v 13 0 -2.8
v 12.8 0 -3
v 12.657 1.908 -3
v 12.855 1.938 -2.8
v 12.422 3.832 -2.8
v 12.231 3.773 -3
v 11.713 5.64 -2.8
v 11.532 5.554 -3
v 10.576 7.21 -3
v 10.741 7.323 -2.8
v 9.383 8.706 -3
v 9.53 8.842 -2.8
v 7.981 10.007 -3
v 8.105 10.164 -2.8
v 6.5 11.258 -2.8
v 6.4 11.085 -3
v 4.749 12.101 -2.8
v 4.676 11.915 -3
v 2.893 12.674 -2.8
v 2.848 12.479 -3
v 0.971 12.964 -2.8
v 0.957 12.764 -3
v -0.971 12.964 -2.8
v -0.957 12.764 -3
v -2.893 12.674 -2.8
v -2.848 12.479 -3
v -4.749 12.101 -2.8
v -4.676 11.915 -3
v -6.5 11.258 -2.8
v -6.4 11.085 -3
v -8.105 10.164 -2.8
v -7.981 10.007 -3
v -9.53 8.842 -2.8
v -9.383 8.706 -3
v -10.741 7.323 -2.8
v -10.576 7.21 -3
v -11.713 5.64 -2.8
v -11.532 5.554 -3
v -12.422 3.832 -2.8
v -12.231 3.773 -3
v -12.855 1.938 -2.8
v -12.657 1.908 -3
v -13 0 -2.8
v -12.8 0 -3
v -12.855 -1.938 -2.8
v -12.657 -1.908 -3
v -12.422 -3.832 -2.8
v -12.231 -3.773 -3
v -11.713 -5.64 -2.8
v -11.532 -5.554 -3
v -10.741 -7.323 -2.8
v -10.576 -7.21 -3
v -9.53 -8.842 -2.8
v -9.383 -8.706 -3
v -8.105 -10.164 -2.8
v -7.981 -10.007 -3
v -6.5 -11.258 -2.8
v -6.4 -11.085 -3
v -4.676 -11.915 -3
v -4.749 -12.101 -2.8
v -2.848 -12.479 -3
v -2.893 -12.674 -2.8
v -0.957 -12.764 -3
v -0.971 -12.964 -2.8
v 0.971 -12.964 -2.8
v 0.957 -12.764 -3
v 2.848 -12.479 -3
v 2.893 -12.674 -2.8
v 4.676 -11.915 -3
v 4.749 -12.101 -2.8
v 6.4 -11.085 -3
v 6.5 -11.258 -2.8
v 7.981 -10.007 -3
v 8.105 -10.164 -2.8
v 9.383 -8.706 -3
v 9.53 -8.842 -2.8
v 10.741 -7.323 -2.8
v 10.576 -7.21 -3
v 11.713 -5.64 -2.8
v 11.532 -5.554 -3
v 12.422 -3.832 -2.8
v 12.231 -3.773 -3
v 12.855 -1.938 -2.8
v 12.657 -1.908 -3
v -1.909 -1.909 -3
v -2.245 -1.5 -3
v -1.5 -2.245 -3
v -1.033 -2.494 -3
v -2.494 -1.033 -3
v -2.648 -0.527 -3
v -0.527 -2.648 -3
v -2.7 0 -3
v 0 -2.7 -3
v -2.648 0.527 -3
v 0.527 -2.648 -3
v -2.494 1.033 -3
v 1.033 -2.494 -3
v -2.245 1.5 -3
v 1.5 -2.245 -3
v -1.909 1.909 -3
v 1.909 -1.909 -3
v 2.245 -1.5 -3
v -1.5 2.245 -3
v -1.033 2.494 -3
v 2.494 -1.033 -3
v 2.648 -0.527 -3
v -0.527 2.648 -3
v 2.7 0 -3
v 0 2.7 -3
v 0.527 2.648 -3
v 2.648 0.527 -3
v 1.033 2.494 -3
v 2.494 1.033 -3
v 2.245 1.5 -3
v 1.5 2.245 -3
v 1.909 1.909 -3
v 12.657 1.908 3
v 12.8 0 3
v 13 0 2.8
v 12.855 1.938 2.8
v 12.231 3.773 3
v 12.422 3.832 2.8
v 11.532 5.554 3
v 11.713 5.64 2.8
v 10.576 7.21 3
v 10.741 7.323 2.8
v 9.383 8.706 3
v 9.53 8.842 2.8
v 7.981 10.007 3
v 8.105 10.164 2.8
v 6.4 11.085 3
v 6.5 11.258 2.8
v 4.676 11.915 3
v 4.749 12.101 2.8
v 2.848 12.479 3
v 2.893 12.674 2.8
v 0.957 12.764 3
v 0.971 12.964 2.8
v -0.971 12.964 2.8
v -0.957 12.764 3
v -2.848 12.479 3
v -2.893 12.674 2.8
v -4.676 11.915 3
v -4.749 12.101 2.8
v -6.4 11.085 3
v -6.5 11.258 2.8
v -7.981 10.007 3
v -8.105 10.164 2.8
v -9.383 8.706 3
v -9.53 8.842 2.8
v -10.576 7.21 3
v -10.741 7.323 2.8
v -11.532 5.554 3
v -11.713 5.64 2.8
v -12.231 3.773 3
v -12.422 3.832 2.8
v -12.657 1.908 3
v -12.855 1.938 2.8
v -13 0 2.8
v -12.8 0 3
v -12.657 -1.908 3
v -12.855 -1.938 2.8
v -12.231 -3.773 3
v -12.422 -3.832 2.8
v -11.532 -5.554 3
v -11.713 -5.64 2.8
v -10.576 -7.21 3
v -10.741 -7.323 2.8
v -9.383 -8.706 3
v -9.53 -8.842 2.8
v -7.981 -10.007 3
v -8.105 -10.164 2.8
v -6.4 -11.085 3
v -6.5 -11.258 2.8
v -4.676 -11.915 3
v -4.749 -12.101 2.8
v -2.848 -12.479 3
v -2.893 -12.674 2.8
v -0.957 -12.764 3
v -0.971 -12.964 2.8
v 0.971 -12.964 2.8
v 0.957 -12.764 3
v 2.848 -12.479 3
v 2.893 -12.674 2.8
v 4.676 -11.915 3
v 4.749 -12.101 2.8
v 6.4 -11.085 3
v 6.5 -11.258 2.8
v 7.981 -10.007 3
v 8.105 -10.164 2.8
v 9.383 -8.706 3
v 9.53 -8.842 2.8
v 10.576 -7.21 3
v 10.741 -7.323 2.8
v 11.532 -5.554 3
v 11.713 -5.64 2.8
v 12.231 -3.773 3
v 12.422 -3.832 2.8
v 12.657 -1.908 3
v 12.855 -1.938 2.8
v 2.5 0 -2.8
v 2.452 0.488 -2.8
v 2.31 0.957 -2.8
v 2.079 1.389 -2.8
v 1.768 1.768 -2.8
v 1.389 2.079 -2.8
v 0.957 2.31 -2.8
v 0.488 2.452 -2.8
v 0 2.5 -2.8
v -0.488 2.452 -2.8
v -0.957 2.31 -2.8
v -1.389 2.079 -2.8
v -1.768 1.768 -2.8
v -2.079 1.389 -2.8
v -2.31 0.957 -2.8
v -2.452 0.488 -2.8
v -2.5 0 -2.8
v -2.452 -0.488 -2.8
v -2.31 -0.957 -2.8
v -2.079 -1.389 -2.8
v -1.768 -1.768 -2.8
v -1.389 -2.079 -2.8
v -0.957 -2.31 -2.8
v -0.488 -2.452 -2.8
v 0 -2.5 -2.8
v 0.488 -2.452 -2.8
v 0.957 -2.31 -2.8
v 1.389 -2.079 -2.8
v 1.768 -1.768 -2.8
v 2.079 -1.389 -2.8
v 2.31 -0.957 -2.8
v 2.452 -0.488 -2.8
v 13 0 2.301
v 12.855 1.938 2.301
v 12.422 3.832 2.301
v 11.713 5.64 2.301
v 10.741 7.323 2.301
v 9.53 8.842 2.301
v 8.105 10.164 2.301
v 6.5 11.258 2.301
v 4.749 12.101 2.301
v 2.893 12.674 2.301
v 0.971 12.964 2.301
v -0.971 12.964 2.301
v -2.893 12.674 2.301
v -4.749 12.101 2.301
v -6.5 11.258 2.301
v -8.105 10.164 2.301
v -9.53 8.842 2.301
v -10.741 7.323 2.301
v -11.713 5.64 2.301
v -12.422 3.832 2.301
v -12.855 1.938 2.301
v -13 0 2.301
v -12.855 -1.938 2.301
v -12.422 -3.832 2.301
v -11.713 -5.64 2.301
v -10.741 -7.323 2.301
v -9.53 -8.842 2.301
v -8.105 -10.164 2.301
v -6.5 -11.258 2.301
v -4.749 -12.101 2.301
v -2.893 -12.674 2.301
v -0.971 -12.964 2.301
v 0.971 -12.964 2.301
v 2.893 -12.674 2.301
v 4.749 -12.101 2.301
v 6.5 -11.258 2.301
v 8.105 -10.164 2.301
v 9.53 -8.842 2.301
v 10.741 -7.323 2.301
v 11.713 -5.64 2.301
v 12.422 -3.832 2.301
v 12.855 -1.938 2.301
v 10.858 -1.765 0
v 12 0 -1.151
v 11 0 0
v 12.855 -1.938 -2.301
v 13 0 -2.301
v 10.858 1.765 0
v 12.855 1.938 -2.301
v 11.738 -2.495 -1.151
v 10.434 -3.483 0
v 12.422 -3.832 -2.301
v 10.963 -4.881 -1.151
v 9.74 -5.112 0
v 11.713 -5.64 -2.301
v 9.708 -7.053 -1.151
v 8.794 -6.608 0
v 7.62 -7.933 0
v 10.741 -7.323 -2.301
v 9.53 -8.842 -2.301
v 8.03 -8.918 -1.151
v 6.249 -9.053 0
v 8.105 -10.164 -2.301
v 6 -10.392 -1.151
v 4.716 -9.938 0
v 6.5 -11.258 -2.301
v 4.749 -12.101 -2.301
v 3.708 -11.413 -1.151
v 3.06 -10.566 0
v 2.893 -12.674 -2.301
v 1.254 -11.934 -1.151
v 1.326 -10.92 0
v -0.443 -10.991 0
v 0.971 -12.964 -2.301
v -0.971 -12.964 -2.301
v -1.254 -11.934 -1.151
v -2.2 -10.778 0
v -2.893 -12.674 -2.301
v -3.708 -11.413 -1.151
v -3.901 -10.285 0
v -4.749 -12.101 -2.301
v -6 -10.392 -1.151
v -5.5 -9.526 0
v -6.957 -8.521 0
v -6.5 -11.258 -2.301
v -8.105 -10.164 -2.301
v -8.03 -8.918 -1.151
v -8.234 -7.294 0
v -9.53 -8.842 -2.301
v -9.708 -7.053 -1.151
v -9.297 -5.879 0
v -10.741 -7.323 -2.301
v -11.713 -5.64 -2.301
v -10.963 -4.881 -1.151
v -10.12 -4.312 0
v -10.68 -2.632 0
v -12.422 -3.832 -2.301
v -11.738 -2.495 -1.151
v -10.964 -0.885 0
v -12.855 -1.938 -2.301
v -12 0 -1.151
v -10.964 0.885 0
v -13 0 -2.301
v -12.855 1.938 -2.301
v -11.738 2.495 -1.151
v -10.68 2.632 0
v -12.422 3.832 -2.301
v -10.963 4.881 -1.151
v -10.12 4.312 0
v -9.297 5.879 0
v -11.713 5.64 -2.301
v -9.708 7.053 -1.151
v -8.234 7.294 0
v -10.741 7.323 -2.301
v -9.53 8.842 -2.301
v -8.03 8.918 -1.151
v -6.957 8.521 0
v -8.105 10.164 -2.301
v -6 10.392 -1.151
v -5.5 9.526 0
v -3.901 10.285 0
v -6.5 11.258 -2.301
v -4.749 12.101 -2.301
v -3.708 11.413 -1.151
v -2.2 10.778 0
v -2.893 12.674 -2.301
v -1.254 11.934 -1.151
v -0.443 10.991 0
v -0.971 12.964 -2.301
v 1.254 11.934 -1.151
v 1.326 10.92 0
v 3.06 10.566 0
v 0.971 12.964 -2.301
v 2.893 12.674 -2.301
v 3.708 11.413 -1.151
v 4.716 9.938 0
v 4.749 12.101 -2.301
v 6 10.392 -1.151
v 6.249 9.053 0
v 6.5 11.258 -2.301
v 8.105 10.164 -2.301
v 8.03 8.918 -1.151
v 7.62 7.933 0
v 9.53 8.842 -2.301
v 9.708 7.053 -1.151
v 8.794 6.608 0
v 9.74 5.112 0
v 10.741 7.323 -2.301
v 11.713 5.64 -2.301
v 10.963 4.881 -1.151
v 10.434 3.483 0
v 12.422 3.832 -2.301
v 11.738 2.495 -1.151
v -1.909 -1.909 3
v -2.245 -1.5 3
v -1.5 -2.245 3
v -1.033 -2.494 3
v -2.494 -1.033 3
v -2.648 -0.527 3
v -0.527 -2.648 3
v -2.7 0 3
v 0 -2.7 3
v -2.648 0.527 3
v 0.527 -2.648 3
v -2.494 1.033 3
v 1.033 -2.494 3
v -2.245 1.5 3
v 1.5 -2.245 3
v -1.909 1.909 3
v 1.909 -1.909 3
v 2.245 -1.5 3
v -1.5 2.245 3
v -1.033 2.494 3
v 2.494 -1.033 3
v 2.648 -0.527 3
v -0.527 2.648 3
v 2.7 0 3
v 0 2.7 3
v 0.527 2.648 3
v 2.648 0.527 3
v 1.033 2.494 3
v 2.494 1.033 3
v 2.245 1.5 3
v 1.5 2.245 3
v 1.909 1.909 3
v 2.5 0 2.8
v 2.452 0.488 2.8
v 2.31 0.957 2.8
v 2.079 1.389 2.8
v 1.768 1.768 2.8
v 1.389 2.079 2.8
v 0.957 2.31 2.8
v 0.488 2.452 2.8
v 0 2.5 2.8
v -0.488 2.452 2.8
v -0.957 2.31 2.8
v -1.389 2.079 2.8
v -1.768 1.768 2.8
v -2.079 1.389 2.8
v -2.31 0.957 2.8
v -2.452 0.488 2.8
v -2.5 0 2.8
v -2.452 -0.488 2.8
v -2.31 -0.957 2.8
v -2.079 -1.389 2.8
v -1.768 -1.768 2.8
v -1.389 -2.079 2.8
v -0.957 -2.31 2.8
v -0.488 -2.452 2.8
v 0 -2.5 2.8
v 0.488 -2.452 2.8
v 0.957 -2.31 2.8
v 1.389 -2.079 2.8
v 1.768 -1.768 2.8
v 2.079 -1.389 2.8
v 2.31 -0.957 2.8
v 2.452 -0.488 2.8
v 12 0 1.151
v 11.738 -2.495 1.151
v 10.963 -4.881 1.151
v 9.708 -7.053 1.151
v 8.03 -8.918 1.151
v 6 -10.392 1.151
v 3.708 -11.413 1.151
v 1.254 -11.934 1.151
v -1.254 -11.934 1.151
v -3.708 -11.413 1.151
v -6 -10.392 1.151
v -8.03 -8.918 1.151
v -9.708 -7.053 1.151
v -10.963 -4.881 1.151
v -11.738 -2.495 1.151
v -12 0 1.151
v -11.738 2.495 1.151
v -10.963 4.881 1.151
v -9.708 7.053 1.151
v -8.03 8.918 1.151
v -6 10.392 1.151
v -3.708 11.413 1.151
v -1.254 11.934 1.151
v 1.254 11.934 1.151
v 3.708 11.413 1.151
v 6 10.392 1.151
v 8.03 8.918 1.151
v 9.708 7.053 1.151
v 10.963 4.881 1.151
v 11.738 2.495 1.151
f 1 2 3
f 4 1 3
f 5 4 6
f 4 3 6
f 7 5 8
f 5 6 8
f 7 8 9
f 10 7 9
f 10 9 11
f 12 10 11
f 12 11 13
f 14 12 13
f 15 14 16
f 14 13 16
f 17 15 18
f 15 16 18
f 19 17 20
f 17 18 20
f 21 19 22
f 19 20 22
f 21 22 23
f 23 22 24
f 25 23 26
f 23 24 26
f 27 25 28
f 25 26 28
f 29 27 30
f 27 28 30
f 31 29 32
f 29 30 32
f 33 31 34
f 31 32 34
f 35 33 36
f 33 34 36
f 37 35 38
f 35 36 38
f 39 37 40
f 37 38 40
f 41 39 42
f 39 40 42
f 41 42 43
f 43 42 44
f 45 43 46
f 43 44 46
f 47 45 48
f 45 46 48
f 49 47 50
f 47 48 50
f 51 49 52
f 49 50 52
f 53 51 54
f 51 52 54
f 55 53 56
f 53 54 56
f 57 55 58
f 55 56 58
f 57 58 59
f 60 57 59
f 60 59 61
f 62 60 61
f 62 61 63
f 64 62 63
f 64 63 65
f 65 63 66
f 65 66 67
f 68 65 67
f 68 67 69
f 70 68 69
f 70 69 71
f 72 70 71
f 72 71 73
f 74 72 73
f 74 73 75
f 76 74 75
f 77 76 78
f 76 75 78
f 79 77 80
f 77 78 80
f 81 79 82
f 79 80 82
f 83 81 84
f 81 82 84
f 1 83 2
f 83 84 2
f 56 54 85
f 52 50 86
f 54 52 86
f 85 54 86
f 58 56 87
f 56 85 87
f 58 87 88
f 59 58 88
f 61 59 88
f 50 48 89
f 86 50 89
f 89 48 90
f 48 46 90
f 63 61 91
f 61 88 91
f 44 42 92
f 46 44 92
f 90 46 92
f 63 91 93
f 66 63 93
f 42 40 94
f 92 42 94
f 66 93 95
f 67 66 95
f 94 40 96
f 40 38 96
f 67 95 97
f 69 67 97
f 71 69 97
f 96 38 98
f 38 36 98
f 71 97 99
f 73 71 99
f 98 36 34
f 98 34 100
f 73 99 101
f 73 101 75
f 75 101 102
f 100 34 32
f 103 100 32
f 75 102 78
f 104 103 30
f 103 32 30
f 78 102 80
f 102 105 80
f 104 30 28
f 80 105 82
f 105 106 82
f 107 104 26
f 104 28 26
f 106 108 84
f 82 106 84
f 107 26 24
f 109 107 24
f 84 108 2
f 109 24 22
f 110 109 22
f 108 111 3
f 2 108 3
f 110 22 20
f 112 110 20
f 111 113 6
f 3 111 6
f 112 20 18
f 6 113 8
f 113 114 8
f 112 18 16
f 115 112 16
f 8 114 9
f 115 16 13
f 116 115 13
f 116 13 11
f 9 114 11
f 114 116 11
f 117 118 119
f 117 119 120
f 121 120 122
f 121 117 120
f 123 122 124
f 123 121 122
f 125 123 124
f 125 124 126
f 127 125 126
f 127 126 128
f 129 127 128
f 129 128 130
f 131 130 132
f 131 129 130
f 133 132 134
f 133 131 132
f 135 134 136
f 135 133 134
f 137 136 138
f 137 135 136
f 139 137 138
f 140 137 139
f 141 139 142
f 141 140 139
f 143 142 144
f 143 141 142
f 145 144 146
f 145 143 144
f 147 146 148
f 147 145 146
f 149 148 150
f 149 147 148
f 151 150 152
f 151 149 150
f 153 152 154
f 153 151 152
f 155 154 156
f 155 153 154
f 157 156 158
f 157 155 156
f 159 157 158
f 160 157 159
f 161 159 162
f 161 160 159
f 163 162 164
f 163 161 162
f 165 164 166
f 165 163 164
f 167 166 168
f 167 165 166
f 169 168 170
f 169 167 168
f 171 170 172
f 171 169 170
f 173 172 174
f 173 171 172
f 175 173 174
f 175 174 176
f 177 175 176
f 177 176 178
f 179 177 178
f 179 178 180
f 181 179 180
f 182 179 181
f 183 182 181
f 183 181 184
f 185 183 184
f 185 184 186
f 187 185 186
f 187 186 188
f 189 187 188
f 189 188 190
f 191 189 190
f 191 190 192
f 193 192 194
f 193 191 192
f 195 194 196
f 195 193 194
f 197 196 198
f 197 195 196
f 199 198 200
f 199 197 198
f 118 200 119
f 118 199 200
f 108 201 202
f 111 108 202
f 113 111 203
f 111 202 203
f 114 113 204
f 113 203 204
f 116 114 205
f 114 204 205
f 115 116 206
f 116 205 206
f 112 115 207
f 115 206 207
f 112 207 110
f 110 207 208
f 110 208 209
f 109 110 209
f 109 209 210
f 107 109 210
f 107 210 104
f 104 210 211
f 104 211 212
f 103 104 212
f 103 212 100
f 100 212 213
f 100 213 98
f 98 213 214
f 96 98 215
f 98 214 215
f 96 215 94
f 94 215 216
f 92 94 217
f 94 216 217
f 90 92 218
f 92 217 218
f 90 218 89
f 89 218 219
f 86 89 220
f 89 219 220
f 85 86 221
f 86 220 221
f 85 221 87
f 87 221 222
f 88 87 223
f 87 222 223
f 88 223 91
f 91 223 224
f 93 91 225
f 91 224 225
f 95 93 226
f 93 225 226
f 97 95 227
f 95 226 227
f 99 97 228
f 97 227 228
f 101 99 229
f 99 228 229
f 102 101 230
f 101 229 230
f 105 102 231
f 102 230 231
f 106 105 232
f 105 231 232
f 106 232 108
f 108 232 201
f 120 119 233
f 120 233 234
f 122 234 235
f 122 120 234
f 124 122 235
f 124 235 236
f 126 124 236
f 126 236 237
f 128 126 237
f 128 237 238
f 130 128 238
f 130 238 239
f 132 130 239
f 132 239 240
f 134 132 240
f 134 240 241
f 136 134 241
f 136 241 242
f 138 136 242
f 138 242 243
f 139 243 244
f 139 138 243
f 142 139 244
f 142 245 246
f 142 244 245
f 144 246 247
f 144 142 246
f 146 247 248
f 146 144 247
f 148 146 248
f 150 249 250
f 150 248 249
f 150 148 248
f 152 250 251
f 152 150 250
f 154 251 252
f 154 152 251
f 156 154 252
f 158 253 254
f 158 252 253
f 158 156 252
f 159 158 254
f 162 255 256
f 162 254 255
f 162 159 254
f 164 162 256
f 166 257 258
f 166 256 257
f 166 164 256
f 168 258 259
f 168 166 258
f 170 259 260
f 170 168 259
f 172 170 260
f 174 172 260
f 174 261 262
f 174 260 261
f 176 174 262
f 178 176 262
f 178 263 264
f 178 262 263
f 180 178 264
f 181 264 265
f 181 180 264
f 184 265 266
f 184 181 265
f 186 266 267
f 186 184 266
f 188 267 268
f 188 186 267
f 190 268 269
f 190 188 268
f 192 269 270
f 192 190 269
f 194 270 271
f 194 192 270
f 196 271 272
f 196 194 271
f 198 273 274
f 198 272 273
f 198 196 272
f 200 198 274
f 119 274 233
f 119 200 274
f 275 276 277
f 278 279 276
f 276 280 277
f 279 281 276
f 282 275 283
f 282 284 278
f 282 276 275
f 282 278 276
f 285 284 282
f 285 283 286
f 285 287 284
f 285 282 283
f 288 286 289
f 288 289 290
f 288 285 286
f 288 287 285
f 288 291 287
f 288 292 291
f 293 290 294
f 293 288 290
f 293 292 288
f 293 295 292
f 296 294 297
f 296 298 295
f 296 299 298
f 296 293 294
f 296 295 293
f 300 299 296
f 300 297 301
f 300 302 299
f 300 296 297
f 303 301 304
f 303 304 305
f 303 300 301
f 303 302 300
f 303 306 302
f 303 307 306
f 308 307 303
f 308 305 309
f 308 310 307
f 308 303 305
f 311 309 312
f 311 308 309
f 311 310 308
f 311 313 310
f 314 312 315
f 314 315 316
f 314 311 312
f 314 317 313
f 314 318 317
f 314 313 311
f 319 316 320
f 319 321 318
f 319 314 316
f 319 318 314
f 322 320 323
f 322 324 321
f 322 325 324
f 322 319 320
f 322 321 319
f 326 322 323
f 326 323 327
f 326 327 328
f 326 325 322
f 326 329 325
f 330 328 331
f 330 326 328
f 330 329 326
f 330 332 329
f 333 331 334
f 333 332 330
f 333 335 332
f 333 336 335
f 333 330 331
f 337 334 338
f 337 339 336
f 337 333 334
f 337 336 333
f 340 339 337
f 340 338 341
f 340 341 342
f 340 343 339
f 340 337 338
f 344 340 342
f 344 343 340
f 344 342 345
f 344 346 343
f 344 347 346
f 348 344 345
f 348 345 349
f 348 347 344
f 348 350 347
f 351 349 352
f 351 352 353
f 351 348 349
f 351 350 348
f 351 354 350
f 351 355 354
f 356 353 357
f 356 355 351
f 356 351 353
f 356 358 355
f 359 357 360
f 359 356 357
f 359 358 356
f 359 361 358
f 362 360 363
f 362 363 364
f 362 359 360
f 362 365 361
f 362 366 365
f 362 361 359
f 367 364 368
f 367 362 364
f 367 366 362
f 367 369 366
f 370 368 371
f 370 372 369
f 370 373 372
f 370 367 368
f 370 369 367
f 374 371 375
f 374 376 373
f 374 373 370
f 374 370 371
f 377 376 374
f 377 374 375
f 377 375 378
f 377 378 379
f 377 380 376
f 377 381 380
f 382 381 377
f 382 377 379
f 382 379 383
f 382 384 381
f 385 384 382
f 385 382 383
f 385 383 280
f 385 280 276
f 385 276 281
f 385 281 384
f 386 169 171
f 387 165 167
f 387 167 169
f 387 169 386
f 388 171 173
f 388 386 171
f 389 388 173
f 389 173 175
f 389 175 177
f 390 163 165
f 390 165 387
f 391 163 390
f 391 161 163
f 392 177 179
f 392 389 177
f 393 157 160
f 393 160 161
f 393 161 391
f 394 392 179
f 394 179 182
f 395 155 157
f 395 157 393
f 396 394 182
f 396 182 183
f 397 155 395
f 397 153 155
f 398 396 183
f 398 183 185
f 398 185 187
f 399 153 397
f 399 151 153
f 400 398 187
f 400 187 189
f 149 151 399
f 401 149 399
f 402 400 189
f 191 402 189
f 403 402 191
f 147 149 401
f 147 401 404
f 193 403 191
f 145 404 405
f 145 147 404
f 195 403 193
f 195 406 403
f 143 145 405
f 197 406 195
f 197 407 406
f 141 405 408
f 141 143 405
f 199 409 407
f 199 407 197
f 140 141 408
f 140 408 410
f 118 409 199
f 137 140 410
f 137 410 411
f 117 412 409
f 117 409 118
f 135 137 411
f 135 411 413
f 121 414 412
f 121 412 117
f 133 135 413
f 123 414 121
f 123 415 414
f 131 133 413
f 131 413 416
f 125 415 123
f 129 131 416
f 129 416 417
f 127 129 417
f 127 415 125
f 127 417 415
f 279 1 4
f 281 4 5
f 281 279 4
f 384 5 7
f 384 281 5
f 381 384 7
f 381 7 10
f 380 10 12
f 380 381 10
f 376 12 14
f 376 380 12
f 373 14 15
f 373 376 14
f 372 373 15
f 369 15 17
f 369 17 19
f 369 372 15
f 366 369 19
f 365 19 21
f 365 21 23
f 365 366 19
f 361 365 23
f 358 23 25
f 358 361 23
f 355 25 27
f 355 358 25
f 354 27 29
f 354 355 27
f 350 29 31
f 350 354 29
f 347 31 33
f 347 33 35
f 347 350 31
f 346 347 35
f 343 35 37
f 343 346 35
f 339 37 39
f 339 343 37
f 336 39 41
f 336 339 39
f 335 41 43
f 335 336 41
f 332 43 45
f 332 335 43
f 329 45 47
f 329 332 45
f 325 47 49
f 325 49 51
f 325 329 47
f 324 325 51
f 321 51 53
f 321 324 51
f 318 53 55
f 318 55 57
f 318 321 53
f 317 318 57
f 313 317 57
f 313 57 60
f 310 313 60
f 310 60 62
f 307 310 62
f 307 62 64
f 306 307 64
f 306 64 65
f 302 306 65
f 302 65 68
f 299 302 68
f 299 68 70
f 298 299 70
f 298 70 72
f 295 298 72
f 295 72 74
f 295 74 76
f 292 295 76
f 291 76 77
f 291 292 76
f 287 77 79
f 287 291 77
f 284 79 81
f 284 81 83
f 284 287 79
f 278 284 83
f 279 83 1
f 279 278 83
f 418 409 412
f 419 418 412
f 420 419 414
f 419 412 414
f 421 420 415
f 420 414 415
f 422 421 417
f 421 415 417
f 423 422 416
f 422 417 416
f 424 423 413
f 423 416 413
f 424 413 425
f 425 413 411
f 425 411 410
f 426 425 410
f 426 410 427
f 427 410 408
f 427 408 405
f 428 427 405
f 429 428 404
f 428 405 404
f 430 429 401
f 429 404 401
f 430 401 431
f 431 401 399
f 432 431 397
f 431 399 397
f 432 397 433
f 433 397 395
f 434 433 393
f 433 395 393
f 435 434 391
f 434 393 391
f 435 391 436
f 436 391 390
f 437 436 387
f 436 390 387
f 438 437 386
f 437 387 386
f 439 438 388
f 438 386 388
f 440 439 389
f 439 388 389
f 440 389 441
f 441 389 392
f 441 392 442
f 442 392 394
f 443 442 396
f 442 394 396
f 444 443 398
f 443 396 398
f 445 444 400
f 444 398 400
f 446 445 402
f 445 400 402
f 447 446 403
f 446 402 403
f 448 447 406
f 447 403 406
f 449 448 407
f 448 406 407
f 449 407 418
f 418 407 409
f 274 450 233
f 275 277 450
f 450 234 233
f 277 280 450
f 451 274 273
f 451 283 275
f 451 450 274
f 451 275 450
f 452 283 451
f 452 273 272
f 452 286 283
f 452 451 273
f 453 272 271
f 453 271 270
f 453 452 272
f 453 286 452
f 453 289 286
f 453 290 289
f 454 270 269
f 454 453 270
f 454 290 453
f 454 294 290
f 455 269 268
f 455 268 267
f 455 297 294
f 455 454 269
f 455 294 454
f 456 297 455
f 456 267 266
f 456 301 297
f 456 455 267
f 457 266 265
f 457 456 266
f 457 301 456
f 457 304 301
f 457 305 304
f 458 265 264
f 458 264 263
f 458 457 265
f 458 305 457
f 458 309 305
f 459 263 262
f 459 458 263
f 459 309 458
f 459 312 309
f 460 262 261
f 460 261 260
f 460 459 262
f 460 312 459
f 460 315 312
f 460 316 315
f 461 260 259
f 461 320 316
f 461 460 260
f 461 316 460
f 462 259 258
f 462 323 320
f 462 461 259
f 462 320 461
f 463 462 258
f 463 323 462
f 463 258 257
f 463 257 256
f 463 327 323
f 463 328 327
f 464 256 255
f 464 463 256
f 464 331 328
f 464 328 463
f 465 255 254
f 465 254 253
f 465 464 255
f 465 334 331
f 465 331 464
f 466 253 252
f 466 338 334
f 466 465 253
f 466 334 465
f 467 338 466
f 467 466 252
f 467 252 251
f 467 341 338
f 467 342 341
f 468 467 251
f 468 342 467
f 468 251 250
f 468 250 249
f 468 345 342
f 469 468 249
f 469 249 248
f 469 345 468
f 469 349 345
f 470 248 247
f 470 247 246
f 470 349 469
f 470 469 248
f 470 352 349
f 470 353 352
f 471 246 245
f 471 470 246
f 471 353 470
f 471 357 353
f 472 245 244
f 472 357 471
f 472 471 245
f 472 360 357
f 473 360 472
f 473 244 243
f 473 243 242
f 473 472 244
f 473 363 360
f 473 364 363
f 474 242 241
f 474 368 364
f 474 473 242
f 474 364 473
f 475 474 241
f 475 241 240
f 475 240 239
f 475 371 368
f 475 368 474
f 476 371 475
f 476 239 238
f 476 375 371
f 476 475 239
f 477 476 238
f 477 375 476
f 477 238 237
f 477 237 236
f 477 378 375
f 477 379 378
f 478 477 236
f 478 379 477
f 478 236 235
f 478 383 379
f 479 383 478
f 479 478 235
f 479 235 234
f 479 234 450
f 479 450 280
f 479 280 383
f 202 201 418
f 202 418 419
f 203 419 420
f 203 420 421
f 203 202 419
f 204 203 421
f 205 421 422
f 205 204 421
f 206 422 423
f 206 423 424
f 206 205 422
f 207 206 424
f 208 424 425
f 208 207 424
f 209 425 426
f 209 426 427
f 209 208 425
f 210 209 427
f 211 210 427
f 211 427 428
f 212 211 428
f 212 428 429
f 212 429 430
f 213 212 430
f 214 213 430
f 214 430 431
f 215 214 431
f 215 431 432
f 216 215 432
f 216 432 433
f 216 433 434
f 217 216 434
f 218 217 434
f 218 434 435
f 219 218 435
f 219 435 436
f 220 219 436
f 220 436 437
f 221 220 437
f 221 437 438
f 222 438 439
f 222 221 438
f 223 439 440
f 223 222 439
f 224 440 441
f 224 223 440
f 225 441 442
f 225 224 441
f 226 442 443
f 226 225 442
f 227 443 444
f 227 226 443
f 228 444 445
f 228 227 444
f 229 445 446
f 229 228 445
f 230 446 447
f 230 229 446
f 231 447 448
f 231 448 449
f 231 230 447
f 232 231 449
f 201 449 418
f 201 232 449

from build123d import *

# Parameters (mm, degrees)
SKETCH_1_R      = 13
SKETCH_1_R_2    = 2.5
EXTRUDE_1_DEPTH = 3
CHAMFER_1_SIZE  = 0.2


with BuildPart() as part:
    # 草图1 → 凸台-拉伸1 (new, symmetric)
    with BuildSketch(Plane.XY):
        Circle(SKETCH_1_R)
        Circle(SKETCH_1_R_2, mode=Mode.SUBTRACT)
    extrude(amount=EXTRUDE_1_DEPTH, both=True)

    # 草图2 → 切除-旋转1 (revolve, cut)
    with BuildSketch(Plane(origin=(0, 0, 0), x_dir=(0, 0, -1), z_dir=(1, 0, 0)), mode=Mode.PRIVATE) as cut_revolve_1_sk:
        Polygon((0, 11), (2.301135457, 13), (-2.301135457, 13), align=None)
    revolve(cut_revolve_1_sk.sketch.rotate(Axis((0, 0, 0), (0, 0, -1)), 90), axis=Axis((0, 0, 0), (0, 0, -1)), mode=Mode.SUBTRACT)

    # 倒角1
    chamfer_1_edges = [part.edges().sort_by_distance(p)[0] for p in [
        (-13, 0, -3),
        (-13, 0, 3),
        (-2.5, 0, -3),
        (-2.5, 0, 3),
    ]]
    chamfer(chamfer_1_edges, length=CHAMFER_1_SIZE)


solid = part.part
